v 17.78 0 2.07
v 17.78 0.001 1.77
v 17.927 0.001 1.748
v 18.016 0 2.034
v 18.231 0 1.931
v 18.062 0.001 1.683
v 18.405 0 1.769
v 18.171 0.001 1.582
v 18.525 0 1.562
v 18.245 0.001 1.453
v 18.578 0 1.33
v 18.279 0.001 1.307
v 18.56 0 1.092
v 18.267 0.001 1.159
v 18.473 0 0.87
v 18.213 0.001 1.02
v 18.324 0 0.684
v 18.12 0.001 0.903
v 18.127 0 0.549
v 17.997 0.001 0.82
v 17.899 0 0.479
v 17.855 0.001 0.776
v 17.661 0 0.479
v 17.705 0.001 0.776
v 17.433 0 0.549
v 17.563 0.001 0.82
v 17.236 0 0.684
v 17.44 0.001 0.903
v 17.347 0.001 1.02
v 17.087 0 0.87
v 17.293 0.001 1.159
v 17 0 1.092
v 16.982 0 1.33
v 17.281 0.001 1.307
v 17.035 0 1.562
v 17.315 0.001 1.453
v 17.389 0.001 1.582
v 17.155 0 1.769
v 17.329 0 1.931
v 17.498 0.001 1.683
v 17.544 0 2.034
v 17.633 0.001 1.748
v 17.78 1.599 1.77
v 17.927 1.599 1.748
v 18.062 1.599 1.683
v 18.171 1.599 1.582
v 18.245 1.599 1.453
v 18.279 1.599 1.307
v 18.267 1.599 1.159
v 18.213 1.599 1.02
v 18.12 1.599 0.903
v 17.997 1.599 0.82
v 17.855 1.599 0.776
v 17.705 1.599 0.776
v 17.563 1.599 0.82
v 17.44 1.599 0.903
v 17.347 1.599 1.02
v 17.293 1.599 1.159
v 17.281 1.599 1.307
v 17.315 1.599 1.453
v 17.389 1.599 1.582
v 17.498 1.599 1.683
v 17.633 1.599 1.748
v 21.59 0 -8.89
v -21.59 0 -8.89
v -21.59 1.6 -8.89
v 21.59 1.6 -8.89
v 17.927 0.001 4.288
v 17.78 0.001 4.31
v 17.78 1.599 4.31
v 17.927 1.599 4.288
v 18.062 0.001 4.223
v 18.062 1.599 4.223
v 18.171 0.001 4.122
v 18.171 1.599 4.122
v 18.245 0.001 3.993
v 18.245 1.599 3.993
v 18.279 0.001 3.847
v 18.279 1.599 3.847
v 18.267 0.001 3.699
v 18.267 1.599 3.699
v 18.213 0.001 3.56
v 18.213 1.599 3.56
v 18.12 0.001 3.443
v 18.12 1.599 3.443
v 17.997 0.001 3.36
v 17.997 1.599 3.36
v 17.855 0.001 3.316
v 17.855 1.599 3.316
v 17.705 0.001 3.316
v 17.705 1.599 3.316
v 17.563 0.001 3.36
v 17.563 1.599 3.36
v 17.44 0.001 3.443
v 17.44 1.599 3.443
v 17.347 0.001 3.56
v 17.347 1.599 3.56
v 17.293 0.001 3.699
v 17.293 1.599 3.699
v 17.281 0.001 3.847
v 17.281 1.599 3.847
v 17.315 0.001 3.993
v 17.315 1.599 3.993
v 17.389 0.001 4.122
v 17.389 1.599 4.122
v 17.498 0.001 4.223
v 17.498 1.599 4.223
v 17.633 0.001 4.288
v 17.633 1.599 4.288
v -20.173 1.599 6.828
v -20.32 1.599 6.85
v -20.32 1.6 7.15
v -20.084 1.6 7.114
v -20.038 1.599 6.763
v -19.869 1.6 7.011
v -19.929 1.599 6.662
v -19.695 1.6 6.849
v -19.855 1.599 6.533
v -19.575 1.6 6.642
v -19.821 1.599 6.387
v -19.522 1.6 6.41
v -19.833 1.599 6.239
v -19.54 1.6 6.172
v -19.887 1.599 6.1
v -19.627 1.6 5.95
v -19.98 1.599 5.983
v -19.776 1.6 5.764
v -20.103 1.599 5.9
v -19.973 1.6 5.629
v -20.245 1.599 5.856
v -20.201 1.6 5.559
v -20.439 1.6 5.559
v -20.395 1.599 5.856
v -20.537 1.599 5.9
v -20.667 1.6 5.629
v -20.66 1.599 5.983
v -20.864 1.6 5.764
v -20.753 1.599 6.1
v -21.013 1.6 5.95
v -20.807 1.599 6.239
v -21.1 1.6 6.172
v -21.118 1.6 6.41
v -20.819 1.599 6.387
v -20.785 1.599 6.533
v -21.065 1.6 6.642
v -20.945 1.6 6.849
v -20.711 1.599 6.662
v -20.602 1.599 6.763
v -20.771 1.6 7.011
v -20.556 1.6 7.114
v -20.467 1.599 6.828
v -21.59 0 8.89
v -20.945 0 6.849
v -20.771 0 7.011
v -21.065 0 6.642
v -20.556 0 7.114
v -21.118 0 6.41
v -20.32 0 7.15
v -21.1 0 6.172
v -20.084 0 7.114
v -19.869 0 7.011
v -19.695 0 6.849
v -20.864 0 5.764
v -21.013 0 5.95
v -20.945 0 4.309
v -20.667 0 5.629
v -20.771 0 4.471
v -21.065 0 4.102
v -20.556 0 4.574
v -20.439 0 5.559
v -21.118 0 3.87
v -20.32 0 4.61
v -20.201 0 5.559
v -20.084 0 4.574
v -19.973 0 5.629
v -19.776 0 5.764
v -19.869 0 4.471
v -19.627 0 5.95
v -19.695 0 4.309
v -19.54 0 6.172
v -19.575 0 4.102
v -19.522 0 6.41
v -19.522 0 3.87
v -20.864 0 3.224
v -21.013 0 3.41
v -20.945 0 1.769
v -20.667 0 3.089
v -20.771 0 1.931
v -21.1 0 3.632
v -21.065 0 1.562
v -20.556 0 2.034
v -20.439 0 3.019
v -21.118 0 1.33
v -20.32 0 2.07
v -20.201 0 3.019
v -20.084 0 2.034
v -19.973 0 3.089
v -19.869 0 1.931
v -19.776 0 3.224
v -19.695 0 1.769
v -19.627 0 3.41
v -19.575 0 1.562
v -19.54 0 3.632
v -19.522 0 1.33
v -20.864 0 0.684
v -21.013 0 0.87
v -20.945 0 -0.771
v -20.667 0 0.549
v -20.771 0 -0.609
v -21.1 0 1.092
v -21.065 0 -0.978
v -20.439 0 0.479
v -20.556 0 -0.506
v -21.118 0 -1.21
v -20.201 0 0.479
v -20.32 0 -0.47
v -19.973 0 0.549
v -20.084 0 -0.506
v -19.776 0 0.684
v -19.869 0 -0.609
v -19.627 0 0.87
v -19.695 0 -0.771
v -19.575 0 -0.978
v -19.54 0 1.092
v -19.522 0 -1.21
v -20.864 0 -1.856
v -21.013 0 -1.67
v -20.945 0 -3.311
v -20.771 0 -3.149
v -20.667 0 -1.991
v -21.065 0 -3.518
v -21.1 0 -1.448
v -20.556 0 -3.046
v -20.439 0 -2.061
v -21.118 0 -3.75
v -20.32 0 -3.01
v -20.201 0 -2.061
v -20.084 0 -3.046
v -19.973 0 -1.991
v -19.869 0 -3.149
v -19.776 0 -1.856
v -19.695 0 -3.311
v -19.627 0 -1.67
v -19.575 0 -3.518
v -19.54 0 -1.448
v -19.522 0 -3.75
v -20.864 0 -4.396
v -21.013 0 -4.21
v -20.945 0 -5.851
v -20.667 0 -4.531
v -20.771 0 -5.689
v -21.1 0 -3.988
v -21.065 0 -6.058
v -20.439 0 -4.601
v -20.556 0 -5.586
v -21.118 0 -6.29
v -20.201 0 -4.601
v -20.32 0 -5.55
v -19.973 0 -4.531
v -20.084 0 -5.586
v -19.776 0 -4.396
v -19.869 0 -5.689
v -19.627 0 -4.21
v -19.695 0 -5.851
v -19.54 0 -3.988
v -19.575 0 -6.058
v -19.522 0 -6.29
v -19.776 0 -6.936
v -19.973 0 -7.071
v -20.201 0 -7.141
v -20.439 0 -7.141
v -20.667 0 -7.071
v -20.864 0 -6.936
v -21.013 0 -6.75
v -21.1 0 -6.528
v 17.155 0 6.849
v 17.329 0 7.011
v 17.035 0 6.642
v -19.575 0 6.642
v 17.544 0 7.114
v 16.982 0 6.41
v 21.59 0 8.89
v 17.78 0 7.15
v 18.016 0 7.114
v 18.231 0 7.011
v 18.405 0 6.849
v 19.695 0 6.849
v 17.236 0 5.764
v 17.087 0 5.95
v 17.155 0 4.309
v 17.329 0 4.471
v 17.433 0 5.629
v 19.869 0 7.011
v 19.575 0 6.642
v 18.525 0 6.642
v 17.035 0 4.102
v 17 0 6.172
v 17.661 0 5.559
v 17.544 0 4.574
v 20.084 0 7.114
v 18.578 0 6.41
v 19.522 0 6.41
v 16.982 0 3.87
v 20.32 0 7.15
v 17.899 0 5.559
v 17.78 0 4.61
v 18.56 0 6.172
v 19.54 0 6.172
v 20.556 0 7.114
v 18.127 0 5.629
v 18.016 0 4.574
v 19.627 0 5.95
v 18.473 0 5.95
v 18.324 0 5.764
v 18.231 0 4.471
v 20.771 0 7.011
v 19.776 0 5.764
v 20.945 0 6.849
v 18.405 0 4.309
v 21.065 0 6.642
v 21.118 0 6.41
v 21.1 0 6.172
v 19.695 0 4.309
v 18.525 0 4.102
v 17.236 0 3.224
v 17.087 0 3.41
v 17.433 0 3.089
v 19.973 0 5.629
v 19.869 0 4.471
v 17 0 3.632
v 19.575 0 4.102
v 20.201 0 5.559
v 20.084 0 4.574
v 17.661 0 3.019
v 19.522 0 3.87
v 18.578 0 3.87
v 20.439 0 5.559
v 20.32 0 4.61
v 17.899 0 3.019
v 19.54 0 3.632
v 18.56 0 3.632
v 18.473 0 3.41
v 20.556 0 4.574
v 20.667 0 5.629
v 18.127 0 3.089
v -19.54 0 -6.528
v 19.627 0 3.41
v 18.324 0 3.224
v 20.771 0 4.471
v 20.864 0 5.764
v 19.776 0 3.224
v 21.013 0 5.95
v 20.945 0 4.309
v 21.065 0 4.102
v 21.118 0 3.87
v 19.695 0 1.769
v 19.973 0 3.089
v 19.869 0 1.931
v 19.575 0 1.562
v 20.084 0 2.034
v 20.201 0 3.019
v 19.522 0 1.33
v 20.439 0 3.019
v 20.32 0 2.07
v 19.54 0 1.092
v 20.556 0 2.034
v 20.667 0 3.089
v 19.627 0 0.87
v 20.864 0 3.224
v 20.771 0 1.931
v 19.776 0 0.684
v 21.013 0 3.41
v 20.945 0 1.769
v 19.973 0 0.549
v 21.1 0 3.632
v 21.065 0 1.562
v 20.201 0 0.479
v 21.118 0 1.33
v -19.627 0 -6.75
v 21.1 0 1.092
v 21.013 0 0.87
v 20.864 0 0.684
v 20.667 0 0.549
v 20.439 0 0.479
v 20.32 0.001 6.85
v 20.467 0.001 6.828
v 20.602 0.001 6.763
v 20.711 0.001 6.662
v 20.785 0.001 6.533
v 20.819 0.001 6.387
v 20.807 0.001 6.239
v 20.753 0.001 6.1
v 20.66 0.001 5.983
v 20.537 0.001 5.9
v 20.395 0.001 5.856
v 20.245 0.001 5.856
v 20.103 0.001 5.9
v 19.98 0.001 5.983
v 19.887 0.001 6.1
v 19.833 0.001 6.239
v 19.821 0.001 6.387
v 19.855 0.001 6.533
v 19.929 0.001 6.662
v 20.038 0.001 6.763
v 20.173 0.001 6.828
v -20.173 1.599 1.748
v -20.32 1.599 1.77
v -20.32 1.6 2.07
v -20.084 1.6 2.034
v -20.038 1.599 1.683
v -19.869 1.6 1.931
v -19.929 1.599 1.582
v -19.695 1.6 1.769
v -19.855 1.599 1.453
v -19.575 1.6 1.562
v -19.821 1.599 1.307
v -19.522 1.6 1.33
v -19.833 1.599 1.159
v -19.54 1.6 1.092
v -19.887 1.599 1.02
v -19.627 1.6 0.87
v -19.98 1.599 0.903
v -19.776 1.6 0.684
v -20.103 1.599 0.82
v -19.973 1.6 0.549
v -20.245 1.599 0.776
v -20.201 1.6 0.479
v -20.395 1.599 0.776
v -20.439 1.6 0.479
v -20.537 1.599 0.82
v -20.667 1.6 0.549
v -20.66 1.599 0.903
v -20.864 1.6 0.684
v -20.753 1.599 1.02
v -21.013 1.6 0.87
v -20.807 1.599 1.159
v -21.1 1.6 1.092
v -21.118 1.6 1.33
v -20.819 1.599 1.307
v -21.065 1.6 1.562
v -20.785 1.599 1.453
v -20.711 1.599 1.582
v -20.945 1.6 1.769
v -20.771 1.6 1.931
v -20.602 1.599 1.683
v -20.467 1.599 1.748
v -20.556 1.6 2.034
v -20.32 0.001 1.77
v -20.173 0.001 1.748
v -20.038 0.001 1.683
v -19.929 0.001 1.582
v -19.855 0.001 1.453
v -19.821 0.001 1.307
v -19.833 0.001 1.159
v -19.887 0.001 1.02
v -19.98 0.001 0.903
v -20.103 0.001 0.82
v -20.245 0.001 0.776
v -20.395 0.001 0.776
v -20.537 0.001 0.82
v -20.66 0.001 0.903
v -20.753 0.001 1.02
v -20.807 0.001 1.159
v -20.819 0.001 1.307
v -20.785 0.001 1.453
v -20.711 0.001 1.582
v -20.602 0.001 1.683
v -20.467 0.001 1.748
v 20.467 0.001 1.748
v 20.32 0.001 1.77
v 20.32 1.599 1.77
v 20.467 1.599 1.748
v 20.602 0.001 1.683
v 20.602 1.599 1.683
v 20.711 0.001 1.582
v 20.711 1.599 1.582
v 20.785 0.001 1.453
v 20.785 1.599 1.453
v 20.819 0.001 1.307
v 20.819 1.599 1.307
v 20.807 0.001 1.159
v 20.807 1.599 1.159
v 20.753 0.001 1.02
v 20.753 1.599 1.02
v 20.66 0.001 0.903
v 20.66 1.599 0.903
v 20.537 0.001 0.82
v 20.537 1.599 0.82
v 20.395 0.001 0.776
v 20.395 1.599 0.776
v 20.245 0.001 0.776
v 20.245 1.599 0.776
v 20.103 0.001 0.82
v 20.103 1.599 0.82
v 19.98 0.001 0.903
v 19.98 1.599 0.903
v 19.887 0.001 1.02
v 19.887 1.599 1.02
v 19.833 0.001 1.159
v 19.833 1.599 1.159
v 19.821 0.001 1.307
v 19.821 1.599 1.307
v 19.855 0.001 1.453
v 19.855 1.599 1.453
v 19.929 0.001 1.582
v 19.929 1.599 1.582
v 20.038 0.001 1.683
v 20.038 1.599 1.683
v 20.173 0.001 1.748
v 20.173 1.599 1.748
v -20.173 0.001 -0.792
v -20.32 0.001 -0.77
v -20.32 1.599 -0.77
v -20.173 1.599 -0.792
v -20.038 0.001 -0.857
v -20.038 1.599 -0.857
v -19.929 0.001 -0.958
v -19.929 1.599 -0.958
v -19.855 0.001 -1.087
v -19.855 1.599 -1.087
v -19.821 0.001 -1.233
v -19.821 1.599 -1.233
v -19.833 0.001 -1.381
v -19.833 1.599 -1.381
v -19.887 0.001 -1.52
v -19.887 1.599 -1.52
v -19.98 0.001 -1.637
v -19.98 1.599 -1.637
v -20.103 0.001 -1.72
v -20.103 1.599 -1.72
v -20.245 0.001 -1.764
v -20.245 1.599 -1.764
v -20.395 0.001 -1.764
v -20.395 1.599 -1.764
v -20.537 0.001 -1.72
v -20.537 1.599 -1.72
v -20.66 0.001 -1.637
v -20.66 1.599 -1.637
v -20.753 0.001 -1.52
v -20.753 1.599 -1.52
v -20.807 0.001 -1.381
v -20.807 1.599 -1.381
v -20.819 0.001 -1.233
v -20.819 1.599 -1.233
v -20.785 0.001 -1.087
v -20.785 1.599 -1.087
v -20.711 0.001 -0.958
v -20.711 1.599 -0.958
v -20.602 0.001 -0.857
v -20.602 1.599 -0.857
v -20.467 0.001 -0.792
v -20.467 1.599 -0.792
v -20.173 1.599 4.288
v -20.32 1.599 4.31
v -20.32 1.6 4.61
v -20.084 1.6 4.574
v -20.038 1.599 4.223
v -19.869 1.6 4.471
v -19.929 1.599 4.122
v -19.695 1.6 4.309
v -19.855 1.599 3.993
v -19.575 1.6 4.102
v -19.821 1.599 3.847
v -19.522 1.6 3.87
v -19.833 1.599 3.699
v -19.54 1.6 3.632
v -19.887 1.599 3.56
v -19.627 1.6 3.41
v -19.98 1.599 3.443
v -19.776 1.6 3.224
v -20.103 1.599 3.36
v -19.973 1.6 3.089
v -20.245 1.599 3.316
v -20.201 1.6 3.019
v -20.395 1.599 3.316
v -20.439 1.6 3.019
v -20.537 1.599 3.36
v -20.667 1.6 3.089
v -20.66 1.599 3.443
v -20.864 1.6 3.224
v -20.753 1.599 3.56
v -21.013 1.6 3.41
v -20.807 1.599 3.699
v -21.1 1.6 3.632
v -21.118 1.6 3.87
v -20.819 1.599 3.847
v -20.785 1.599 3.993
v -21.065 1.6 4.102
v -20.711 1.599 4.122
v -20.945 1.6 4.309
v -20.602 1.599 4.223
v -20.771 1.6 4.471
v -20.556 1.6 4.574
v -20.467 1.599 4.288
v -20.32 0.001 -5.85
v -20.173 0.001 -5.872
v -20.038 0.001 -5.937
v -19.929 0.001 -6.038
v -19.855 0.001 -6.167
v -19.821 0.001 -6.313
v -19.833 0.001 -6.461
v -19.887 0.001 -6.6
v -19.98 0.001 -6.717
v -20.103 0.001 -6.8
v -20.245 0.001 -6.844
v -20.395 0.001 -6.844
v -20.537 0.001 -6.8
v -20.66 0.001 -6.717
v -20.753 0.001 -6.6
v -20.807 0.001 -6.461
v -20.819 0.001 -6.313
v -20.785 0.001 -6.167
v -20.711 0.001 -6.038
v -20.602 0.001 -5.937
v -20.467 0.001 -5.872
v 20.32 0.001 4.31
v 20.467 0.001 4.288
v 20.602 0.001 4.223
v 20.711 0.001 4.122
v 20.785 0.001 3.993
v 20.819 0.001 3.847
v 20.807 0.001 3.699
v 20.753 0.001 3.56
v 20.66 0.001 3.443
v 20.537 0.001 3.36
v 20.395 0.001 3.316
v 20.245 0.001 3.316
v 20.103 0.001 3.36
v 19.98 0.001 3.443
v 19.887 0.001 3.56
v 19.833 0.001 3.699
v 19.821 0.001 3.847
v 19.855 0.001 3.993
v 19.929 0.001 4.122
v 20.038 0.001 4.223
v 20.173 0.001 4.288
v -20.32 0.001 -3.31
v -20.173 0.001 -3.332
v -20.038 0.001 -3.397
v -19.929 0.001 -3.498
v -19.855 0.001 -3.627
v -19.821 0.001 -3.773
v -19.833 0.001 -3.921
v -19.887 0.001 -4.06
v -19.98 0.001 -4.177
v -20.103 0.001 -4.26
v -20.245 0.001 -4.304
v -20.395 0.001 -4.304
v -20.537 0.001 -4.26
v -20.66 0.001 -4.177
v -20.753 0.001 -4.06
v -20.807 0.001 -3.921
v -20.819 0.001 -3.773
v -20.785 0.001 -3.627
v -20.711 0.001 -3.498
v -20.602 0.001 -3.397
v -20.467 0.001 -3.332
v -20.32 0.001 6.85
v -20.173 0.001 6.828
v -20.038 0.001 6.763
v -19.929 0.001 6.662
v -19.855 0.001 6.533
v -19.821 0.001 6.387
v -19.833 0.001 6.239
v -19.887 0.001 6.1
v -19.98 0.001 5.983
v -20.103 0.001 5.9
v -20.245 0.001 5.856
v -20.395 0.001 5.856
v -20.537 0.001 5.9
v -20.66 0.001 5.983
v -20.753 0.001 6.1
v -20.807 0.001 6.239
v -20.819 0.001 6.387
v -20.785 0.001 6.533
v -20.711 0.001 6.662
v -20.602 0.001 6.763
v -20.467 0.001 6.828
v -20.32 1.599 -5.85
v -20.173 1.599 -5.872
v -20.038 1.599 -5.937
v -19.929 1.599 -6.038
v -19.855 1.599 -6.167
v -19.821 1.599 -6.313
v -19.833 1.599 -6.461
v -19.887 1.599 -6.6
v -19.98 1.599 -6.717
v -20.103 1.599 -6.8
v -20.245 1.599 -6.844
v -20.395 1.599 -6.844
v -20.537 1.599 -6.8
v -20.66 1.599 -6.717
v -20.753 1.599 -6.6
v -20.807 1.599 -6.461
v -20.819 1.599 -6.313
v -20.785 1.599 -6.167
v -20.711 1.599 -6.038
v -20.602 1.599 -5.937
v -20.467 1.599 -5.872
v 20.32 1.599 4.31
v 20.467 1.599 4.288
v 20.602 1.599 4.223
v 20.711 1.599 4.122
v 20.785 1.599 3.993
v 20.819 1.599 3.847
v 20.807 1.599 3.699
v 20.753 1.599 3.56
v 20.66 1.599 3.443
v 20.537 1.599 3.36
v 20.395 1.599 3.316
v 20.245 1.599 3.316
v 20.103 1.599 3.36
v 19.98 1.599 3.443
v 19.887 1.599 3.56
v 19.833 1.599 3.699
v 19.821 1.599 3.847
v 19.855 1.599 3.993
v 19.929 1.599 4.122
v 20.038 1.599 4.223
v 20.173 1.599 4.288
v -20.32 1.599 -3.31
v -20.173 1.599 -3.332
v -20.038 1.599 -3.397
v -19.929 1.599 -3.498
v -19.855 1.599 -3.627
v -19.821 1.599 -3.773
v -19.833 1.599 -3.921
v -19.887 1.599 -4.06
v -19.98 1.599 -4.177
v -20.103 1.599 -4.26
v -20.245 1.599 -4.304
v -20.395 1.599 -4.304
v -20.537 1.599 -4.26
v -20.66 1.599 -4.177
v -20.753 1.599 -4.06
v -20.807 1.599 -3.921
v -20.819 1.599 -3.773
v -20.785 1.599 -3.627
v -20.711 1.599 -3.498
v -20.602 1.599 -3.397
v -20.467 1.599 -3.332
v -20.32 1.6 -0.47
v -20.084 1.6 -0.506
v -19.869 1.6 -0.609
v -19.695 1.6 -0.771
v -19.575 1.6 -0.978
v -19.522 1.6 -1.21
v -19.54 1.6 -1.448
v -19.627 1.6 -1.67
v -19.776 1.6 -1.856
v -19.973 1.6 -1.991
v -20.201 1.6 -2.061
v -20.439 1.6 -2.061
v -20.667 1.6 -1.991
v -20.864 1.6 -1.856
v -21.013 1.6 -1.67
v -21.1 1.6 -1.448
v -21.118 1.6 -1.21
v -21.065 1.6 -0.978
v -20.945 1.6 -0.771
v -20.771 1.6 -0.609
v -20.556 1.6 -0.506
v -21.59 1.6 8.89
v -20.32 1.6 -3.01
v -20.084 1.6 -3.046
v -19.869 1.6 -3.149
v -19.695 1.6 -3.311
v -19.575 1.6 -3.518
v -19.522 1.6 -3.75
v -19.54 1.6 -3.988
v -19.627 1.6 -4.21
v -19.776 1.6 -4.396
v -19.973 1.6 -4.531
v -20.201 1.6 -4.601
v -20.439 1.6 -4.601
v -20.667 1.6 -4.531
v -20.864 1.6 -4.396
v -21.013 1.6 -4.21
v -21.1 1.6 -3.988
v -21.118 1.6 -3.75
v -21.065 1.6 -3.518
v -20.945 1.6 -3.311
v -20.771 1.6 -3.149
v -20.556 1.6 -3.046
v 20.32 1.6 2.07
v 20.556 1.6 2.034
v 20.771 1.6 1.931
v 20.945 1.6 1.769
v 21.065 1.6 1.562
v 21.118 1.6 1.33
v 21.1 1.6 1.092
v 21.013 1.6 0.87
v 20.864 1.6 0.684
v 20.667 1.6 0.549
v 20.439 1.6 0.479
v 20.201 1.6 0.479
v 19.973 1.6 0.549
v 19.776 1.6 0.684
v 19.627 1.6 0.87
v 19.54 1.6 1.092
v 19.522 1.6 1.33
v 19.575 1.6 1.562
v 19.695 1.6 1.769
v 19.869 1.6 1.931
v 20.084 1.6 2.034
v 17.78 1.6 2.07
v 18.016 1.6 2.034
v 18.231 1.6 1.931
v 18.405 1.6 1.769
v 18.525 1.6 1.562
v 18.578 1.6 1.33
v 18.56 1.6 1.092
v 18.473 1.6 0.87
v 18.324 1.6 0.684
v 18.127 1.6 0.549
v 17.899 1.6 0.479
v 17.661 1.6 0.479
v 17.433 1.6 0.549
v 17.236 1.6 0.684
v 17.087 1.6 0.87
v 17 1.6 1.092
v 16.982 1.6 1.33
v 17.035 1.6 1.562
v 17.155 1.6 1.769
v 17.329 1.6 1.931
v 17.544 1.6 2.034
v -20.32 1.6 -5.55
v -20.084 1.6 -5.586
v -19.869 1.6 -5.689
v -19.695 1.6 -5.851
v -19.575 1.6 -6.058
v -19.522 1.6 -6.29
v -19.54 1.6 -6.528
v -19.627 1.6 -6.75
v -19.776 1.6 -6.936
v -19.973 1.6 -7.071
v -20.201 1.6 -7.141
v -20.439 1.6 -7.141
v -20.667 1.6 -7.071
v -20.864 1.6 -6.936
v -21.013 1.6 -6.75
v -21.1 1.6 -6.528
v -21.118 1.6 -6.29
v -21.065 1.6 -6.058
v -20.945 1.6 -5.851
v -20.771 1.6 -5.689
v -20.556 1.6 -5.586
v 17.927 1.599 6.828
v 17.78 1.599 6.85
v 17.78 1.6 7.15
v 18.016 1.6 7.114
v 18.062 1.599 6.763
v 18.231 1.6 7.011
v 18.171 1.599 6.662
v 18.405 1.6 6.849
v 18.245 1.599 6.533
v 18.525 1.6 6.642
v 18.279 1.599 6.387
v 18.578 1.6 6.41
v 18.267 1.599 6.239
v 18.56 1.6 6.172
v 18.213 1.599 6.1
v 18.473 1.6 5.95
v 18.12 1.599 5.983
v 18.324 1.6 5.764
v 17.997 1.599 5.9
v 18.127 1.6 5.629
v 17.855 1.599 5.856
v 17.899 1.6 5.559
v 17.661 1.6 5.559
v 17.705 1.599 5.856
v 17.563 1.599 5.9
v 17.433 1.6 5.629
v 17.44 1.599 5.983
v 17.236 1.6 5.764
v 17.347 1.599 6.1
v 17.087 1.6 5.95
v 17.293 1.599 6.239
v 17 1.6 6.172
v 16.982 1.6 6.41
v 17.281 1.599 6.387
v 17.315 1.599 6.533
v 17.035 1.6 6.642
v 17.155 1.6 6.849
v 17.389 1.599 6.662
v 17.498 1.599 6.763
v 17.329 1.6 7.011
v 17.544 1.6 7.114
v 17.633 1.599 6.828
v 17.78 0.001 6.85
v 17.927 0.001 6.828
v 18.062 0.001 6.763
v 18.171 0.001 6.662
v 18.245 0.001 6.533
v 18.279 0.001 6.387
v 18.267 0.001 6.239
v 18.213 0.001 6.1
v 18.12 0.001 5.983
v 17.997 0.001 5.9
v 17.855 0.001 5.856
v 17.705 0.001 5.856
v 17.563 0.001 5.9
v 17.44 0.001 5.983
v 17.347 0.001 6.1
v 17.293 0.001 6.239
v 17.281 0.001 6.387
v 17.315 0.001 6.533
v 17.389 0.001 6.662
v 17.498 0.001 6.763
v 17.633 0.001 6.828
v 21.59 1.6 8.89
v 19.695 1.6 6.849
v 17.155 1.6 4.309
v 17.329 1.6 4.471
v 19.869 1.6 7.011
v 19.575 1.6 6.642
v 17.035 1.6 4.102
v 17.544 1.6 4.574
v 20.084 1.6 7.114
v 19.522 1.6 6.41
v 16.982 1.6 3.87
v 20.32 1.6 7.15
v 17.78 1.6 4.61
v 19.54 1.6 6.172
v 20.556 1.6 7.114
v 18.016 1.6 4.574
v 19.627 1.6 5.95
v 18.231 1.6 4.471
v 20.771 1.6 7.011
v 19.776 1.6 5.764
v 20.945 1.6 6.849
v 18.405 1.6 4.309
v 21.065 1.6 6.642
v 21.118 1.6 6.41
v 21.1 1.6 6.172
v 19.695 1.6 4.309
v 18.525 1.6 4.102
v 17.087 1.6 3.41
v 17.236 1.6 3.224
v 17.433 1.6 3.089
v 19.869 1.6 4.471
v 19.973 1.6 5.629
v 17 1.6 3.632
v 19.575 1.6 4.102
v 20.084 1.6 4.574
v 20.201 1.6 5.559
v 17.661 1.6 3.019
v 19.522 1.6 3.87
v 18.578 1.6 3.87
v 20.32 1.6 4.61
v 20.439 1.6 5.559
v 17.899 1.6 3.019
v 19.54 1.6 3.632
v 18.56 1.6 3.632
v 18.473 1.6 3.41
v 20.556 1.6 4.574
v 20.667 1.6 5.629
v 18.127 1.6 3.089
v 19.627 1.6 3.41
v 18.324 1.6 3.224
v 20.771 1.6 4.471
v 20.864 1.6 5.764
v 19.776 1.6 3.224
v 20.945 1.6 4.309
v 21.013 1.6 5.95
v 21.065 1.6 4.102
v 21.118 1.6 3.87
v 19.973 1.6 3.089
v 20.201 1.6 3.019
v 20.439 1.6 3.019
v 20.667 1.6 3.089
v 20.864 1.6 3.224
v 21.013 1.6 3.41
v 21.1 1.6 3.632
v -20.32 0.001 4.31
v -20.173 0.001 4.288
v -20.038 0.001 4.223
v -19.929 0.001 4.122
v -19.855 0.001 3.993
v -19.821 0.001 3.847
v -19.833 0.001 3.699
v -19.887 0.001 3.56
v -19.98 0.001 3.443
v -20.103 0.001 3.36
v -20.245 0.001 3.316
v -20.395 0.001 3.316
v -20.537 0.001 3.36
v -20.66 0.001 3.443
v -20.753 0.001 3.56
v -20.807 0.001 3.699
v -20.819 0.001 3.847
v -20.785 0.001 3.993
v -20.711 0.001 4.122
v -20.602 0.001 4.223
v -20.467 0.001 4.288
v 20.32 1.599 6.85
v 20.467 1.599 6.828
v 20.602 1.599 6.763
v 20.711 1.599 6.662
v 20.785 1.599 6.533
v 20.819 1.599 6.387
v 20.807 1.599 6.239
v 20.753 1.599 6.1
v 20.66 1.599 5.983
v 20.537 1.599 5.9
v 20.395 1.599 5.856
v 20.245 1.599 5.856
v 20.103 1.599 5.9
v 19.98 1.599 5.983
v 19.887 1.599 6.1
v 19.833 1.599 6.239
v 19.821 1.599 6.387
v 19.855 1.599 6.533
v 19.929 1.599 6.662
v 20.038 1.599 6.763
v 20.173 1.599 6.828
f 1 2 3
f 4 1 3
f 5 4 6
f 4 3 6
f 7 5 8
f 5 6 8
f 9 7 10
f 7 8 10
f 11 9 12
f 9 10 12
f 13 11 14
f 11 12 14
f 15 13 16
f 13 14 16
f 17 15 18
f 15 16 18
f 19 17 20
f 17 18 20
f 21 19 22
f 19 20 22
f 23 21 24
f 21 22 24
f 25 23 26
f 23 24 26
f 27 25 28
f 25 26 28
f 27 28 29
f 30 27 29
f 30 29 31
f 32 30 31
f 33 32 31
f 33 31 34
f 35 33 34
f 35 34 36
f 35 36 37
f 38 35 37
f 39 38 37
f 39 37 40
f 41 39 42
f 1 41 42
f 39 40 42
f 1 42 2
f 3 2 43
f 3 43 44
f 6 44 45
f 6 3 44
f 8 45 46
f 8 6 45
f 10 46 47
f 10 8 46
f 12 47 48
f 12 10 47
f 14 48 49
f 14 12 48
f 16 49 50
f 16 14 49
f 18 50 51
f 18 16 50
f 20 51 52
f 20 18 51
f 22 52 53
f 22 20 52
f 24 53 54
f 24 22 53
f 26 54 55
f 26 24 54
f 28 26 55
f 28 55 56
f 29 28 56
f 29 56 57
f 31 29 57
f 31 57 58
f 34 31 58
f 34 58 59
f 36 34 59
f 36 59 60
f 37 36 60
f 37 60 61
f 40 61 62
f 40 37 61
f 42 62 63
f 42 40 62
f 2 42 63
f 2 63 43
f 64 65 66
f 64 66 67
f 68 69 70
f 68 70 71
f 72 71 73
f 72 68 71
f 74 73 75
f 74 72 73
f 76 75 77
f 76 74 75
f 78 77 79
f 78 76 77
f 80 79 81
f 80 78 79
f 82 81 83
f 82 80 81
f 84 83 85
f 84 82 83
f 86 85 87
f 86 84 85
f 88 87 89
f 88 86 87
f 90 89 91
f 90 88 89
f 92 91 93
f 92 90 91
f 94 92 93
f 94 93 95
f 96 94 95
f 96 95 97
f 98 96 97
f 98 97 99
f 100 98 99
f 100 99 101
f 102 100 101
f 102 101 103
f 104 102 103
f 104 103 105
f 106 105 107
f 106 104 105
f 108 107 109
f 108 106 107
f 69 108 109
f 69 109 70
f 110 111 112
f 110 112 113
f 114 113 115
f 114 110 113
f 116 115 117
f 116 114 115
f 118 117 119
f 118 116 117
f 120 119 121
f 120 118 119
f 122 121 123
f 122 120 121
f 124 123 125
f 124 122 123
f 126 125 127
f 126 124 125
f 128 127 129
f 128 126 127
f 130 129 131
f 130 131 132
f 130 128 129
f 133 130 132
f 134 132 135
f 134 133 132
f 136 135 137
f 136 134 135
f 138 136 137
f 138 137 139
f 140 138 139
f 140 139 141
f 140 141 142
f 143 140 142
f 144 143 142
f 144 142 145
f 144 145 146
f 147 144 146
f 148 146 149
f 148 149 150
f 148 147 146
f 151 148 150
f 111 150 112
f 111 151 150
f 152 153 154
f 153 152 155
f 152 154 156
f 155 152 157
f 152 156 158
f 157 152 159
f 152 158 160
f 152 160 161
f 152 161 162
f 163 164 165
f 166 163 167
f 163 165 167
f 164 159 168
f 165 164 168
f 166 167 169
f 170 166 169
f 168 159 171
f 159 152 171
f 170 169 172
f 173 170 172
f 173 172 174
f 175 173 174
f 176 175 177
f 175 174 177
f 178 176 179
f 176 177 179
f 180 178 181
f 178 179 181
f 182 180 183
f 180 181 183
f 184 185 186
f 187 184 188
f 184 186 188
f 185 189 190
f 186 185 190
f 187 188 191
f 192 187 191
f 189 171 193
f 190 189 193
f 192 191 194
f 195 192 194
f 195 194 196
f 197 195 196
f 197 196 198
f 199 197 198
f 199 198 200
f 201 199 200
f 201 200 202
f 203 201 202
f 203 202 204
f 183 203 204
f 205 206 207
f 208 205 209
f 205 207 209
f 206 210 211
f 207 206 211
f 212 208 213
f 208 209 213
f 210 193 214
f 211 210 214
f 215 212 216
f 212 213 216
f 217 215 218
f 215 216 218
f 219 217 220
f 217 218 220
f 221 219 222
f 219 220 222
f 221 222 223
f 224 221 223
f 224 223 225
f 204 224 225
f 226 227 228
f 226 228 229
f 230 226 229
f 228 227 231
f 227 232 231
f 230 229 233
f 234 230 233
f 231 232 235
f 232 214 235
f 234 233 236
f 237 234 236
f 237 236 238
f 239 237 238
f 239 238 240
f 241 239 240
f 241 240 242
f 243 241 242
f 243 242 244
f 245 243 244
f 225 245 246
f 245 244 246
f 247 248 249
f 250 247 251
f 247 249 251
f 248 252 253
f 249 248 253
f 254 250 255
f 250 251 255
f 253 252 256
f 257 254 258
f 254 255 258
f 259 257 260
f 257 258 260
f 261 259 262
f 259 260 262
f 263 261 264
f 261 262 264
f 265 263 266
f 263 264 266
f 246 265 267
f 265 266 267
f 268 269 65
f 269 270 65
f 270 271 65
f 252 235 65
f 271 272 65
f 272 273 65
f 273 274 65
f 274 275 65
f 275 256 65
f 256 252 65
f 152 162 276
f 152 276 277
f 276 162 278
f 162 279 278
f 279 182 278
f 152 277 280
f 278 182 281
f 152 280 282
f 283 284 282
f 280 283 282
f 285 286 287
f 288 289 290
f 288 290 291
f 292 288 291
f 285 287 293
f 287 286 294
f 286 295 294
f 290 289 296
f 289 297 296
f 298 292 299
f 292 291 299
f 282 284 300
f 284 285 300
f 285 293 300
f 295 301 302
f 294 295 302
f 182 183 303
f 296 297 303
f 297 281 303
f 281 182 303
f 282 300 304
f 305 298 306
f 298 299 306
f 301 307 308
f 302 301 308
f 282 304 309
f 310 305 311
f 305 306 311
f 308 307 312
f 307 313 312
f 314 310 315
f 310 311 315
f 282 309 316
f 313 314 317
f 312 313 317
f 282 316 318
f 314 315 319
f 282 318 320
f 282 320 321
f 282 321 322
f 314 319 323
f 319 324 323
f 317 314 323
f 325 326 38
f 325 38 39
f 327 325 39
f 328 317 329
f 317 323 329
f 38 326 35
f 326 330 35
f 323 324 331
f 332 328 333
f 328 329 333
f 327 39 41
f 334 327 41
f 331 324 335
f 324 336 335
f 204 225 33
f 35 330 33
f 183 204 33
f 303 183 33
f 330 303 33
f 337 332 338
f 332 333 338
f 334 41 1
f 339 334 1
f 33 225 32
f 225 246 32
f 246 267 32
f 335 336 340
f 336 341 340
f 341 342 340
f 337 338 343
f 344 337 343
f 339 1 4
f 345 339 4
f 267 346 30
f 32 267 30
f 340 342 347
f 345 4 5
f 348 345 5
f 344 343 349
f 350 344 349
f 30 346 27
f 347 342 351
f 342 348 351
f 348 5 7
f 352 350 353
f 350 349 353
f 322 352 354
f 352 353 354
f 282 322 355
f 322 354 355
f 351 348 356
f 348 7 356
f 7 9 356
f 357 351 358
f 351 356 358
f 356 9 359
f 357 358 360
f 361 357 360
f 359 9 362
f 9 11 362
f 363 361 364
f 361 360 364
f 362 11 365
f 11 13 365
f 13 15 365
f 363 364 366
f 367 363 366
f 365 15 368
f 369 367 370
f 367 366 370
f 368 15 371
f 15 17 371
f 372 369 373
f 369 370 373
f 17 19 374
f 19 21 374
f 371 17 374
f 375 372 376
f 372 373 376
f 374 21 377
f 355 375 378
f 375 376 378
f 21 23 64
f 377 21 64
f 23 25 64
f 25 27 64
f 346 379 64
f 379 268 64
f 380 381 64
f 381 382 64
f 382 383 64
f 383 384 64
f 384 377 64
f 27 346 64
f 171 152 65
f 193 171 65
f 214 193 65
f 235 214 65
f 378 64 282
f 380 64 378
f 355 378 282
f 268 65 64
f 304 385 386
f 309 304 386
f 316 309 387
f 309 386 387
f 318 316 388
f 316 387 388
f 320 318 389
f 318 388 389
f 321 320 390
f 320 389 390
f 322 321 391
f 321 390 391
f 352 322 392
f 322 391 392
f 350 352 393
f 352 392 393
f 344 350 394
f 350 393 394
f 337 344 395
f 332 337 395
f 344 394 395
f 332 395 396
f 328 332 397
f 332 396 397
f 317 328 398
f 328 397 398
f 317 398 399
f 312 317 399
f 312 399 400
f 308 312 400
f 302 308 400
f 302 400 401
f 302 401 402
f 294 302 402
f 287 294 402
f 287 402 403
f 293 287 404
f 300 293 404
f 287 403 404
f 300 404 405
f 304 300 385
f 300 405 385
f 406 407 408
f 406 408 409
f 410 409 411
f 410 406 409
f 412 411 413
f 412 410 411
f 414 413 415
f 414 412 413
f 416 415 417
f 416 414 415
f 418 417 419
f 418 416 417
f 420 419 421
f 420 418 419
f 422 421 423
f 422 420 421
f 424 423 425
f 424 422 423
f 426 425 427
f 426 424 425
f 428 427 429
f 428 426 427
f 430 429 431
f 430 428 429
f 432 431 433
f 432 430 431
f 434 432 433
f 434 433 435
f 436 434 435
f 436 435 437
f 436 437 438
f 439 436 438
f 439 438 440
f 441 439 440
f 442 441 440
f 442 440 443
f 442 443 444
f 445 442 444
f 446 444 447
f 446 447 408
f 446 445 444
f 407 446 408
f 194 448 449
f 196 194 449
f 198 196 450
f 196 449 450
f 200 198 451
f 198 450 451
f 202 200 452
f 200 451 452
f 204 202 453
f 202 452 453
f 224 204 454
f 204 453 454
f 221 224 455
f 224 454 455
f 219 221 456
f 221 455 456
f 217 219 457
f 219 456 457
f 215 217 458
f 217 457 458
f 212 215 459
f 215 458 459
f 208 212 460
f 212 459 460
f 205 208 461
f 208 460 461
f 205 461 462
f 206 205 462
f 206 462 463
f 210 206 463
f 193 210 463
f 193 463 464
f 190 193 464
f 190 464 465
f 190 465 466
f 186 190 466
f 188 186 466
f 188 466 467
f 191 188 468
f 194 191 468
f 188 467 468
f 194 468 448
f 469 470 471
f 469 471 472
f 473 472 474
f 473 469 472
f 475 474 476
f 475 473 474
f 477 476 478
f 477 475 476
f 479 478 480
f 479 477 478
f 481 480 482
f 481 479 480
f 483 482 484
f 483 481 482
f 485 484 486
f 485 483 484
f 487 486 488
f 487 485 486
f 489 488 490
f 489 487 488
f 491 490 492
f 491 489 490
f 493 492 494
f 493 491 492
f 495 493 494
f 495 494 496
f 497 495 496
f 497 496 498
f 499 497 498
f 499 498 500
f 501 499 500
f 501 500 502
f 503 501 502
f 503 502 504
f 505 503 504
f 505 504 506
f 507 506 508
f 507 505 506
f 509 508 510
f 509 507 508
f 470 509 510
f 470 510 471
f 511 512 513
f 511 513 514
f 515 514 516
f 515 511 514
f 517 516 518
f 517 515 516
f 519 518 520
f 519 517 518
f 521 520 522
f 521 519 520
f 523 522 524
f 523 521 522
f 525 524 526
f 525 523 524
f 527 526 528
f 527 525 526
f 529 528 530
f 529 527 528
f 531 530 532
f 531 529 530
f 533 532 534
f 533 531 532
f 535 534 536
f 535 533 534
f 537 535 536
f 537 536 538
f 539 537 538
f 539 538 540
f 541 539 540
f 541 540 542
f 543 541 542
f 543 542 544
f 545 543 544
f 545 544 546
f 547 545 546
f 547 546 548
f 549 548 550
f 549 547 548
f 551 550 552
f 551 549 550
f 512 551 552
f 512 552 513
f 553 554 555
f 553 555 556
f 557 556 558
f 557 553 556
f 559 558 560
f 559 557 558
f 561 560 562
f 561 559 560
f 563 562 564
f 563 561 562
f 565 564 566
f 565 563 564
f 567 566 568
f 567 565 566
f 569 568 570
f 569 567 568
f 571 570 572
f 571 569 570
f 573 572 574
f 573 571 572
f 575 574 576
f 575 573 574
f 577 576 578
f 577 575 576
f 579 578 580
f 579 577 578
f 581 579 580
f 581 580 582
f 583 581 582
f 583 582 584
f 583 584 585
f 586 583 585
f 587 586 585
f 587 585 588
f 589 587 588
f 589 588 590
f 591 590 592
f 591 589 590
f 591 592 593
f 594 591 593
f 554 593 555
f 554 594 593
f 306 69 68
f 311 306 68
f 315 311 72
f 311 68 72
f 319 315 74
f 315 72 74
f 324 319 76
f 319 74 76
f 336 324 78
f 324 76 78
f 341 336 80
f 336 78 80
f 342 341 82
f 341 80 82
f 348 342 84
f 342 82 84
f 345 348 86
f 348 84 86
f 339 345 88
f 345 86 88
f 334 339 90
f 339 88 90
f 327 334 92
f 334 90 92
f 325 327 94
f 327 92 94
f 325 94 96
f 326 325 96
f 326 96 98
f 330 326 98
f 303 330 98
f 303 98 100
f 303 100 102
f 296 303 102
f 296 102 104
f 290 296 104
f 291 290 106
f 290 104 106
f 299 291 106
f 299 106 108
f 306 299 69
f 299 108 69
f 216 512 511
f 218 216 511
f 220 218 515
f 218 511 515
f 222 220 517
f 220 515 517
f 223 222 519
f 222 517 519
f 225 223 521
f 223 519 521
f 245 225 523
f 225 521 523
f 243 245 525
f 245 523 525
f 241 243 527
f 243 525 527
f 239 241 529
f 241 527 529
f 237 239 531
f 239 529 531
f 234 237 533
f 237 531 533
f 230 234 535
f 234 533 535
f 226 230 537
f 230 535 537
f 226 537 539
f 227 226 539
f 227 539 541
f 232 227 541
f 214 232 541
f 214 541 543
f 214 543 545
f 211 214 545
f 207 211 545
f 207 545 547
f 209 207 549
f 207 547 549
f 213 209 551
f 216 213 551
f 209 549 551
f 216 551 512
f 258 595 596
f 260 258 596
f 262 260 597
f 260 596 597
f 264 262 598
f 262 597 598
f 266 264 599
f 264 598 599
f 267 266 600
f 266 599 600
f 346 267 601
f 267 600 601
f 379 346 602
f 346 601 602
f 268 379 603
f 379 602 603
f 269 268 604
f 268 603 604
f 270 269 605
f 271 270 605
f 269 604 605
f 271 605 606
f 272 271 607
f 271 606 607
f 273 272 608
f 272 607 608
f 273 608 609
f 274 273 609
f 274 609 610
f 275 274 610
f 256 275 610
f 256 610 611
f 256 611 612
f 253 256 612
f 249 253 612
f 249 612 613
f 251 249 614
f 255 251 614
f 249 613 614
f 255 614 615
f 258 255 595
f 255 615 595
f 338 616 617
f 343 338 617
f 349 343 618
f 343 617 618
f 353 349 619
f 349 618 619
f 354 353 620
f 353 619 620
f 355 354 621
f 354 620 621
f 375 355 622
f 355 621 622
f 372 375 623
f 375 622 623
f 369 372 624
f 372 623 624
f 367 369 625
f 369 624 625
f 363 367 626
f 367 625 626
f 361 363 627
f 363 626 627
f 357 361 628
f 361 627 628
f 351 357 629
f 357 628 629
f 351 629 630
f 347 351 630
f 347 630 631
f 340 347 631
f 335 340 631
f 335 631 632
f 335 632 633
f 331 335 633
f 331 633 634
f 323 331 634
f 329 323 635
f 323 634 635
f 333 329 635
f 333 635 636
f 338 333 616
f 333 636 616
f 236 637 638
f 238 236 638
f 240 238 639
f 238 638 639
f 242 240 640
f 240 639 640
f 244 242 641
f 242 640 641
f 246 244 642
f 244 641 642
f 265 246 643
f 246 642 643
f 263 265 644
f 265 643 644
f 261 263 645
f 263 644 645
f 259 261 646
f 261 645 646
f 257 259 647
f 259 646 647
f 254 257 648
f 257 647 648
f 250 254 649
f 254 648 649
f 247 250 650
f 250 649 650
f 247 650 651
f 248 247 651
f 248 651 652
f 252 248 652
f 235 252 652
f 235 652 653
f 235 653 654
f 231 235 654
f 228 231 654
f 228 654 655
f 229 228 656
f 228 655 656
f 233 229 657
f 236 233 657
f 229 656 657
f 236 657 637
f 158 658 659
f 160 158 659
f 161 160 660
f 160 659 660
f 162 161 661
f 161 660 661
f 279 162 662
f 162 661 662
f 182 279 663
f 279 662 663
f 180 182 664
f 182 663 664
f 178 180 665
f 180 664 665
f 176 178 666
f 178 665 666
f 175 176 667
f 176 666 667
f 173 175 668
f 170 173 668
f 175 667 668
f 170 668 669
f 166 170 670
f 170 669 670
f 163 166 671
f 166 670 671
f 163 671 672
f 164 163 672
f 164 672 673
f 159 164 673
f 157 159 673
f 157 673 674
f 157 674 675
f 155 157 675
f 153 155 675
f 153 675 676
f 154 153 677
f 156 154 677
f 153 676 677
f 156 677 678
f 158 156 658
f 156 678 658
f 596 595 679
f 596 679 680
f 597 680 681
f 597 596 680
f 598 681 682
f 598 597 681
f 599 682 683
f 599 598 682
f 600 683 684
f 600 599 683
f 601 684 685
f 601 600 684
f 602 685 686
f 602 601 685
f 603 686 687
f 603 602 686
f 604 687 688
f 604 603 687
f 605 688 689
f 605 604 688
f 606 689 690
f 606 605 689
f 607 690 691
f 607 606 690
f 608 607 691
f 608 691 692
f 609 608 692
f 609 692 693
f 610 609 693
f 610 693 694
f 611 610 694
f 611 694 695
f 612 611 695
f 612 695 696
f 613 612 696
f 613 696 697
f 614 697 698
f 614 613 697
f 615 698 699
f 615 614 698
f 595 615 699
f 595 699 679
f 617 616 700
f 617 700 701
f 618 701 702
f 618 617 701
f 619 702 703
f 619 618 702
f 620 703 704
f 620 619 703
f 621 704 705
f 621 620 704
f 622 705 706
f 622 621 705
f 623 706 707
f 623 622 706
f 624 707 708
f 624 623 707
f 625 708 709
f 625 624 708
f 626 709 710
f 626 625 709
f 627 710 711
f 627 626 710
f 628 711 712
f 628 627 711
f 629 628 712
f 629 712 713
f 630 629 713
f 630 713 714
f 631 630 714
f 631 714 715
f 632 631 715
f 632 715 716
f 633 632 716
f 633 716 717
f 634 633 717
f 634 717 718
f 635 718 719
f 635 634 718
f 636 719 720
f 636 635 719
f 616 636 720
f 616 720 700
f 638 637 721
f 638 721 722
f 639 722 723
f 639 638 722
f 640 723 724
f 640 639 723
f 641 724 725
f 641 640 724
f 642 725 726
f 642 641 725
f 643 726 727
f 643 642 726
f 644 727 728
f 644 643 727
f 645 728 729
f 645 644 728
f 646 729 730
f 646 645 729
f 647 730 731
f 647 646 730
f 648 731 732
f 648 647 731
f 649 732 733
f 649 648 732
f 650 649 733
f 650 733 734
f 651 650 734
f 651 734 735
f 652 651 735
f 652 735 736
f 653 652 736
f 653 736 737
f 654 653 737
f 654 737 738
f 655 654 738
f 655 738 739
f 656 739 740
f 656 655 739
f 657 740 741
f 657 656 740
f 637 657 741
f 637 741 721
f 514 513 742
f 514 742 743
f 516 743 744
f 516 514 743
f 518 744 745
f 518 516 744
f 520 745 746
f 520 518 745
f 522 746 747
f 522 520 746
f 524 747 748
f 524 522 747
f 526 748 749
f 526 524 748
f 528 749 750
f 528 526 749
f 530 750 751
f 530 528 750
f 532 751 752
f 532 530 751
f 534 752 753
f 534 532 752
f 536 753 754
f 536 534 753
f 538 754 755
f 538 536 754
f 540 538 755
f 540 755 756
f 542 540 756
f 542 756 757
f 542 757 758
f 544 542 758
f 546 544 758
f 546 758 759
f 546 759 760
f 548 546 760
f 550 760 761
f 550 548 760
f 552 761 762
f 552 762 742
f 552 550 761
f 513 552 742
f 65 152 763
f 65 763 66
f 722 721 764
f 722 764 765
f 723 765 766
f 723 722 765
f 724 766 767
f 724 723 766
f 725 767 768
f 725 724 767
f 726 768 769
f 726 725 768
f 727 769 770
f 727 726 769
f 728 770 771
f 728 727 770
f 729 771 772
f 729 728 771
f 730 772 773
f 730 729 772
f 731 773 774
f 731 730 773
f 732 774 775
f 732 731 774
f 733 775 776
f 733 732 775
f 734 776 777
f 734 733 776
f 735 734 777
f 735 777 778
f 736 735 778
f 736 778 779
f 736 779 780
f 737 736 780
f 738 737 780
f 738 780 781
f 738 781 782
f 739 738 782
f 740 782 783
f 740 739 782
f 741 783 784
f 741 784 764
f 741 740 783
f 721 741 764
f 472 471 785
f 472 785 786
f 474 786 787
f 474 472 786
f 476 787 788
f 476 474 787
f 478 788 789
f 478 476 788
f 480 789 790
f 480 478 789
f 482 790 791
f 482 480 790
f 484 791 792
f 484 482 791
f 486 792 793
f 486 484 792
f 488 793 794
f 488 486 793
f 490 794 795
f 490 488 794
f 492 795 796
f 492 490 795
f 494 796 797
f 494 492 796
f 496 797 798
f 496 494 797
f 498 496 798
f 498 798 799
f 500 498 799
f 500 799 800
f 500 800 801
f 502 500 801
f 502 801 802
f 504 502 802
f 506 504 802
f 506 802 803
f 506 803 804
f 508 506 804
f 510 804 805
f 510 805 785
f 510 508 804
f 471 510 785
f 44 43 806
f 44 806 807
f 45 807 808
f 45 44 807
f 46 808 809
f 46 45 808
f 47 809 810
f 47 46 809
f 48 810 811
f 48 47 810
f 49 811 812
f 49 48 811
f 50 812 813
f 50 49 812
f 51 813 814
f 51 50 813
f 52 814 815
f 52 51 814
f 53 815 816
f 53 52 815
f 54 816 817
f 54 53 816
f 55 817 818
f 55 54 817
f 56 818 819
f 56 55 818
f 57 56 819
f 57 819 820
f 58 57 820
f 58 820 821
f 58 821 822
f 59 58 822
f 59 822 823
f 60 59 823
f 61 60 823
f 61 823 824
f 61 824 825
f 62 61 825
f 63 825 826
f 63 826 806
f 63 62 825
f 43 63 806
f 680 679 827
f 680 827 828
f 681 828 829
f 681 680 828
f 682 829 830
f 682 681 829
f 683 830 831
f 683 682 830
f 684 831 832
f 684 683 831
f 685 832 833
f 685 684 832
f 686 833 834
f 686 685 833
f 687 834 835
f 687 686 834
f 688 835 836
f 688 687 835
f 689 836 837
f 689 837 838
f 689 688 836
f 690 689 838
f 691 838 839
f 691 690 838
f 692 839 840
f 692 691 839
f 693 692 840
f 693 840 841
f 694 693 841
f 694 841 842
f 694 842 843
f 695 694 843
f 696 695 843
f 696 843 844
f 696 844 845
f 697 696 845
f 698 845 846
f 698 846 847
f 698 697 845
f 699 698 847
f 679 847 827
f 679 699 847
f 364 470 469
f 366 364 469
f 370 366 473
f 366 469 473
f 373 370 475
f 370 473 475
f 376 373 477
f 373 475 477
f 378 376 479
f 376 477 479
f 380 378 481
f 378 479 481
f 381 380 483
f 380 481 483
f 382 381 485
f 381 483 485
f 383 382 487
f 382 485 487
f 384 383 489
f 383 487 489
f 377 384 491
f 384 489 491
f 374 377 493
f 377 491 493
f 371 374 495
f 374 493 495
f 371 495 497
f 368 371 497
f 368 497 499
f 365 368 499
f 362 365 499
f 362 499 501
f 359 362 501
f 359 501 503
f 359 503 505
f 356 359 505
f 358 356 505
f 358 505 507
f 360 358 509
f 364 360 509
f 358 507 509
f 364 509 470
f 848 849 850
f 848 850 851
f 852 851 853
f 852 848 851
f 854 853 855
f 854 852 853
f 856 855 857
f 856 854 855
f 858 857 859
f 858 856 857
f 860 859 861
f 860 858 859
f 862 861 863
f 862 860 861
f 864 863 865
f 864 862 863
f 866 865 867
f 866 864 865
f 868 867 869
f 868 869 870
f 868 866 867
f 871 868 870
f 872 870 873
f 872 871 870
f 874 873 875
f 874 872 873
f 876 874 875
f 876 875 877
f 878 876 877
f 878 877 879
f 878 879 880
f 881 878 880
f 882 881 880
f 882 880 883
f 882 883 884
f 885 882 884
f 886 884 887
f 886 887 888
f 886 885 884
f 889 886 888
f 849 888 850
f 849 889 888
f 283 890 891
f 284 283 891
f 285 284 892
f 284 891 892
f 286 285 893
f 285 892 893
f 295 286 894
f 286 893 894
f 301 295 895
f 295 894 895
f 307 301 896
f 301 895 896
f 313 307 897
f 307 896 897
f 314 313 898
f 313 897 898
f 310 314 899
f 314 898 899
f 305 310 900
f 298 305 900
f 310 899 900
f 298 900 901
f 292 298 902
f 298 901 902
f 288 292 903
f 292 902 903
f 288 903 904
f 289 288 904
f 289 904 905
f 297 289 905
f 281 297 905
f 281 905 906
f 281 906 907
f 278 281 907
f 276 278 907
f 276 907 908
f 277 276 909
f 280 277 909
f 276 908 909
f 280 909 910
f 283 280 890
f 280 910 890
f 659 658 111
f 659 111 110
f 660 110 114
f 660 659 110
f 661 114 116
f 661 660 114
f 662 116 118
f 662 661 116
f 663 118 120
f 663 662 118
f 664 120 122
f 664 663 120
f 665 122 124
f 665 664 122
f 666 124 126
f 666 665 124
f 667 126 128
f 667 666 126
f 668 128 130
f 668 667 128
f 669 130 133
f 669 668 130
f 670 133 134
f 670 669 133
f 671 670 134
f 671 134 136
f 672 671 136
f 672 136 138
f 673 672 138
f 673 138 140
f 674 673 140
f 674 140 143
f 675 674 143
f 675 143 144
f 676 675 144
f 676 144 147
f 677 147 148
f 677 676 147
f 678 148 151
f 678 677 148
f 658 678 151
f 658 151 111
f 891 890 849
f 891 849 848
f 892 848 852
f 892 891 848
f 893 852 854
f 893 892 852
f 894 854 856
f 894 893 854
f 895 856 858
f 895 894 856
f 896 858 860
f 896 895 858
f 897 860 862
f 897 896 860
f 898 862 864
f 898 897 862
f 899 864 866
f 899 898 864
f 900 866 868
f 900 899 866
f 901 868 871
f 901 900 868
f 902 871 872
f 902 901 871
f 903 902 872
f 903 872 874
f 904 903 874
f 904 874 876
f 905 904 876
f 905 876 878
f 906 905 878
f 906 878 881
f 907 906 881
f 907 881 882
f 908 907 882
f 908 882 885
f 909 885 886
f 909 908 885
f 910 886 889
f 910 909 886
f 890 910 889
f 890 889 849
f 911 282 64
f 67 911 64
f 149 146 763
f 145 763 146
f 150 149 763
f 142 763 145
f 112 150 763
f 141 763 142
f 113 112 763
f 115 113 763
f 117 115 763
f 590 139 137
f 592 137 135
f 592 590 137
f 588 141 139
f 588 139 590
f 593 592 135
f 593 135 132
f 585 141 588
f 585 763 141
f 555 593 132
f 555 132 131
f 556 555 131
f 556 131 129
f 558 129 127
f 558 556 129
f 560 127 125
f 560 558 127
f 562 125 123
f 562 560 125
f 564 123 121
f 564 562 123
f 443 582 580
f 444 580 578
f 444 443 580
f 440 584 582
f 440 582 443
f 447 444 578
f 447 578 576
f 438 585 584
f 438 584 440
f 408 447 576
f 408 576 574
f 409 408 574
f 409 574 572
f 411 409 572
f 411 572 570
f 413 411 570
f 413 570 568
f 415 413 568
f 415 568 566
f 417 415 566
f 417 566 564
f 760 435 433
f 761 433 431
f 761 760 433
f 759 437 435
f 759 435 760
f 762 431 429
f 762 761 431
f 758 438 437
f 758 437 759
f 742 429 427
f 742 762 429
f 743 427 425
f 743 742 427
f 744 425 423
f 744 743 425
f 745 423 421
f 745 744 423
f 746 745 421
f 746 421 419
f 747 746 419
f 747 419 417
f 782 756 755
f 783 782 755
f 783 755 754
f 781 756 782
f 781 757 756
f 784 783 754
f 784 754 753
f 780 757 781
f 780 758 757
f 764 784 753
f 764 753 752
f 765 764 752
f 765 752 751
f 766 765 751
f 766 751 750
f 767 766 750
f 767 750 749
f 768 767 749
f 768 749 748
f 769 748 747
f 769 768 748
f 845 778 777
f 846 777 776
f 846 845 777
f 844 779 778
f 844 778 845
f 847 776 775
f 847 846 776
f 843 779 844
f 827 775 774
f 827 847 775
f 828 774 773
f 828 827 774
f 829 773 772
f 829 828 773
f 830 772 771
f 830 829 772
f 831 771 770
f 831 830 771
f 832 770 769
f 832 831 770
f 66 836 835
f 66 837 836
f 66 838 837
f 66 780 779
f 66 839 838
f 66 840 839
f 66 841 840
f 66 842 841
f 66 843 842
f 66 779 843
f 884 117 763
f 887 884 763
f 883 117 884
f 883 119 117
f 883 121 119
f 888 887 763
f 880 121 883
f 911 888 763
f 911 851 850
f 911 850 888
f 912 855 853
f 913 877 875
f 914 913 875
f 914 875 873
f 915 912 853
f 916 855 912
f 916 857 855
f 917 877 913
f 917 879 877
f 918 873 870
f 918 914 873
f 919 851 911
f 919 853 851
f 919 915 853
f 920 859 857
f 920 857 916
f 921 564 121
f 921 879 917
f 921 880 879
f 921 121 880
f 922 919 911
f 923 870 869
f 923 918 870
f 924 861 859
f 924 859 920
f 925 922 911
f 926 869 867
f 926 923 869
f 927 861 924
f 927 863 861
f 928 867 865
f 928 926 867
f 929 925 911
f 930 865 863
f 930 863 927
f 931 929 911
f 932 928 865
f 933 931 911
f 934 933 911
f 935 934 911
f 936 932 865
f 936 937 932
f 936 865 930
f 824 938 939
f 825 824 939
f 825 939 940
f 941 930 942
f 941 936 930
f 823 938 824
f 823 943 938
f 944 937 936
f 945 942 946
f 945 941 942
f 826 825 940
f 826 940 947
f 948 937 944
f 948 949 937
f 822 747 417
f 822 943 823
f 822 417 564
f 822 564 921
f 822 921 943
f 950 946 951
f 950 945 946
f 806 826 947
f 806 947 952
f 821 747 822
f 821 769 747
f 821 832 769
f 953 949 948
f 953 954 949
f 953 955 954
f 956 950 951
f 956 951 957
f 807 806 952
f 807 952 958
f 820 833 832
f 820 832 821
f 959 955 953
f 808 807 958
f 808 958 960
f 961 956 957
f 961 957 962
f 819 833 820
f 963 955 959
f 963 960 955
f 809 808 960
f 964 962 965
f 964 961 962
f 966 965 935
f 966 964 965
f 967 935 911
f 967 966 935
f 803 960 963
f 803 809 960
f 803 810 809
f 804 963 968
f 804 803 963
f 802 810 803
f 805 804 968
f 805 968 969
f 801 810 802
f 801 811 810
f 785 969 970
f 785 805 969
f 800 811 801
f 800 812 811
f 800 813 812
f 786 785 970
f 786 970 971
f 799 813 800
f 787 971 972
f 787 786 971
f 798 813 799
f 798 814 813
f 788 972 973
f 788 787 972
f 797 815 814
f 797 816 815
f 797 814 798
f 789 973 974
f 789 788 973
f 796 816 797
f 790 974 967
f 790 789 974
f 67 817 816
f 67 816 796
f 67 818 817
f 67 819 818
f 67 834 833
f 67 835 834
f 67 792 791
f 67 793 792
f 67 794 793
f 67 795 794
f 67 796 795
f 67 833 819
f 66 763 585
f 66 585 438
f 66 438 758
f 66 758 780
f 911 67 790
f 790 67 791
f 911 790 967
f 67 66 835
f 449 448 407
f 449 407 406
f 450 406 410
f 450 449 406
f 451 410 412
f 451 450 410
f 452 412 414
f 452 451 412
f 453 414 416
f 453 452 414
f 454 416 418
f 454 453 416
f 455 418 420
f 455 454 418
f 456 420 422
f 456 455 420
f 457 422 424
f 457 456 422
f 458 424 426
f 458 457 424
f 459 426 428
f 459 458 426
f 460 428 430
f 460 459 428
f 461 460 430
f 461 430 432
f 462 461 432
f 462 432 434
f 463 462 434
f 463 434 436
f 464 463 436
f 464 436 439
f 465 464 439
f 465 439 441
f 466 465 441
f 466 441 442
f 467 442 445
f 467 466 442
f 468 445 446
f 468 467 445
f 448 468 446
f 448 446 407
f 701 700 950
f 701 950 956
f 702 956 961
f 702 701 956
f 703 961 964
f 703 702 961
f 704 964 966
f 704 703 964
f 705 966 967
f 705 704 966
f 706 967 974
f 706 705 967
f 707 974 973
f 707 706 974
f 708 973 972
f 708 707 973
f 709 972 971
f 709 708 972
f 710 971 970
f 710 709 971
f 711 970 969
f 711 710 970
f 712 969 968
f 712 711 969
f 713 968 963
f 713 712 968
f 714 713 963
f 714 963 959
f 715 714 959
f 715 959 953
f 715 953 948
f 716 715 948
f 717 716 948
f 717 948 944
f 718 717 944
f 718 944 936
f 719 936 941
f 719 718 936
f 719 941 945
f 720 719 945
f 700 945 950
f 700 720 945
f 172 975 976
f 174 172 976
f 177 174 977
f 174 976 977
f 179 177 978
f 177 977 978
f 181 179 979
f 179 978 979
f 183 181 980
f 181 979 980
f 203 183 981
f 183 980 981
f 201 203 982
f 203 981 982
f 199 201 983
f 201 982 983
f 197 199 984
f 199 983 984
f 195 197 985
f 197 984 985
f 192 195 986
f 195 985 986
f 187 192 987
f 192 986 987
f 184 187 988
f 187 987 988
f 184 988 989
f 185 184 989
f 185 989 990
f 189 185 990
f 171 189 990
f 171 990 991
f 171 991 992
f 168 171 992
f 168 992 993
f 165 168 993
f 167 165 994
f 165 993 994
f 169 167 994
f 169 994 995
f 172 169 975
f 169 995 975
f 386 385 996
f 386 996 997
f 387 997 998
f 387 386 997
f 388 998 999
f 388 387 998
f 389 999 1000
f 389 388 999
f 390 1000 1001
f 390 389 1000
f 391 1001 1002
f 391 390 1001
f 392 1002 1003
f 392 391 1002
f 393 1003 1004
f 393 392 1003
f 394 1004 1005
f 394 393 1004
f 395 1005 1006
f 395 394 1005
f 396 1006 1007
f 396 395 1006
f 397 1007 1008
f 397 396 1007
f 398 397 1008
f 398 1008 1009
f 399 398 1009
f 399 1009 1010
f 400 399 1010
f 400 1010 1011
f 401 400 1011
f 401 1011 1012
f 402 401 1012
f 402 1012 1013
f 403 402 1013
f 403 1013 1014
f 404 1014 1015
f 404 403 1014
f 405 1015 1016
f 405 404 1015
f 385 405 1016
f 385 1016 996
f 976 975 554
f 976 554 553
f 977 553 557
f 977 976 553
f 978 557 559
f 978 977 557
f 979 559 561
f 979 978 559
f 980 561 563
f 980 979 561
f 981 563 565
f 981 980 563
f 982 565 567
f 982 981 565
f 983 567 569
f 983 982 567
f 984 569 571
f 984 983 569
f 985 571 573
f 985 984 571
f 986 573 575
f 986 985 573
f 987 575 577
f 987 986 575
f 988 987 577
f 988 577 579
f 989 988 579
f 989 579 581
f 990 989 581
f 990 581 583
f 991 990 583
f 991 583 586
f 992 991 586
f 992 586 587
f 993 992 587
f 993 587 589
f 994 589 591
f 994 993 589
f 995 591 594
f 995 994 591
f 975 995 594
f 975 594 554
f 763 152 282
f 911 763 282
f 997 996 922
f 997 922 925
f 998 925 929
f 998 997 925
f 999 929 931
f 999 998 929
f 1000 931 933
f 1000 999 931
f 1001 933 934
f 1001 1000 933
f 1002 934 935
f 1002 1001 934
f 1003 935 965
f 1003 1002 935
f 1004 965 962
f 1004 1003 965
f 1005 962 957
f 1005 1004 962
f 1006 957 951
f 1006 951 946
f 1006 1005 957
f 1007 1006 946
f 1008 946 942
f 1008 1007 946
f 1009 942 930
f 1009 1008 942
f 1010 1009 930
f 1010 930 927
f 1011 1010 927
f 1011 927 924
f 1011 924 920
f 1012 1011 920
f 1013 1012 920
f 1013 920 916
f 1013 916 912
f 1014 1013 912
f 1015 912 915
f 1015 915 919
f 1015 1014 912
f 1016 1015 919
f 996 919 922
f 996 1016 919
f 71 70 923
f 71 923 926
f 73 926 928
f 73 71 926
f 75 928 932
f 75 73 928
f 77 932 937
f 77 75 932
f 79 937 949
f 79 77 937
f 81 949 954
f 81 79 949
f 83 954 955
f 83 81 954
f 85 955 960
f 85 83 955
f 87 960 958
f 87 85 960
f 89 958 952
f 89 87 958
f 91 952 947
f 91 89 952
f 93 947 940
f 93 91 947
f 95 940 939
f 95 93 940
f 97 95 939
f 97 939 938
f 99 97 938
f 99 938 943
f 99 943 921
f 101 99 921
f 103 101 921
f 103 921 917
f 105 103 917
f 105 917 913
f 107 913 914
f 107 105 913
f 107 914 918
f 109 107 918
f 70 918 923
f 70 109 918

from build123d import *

# Parameters (mm, degrees)
SKETCH1_W           = 43.18
SKETCH1_H           = 17.78
SKETCH1_R           = 0.5
BOSS_EXTRUDE1_DEPTH = 1.6
CHAMFER1_SIZE       = 0.3
CHAMFER1_SIZE2      = 0.000523599
CHAMFER2_SIZE       = 0.3
CHAMFER2_SIZE2      = 0.000523599


with BuildPart() as part:
    # Sketch1 → Boss-Extrude1 (new body)
    with BuildSketch(Plane(origin=(0, 0, 0), x_dir=(1, 0, 0), z_dir=(0, 1, 0))):
        Rectangle(SKETCH1_W, SKETCH1_H)
        with Locations(Location((20.32, -6.35, 0), (0, 0, 270))):
            Circle(SKETCH1_R, mode=Mode.SUBTRACT)
        with Locations(Location((-20.32, 3.81, 0), (0, 0, 270))):
            Circle(SKETCH1_R, mode=Mode.SUBTRACT)
        with Locations(Location((-20.32, 1.27, 0), (0, 0, 270))):
            Circle(SKETCH1_R, mode=Mode.SUBTRACT)
        with Locations(Location((-20.32, -1.27, 0), (0, 0, 270))):
            Circle(SKETCH1_R, mode=Mode.SUBTRACT)
        with Locations(Location((-20.32, 6.35, 0), (0, 0, 270))):
            Circle(SKETCH1_R, mode=Mode.SUBTRACT)
        with Locations(Location((-20.32, -3.81, 0), (0, 0, 270))):
            Circle(SKETCH1_R, mode=Mode.SUBTRACT)
        with Locations(Location((-20.32, -6.35, 0), (0, 0, 270))):
            Circle(SKETCH1_R, mode=Mode.SUBTRACT)
        with Locations(Location((17.78, -6.35, 0), (0, 0, 270))):
            Circle(SKETCH1_R, mode=Mode.SUBTRACT)
        with Locations(Location((17.78, -3.81, 0), (0, 0, 270))):
            Circle(SKETCH1_R, mode=Mode.SUBTRACT)
        with Locations(Location((17.78, -1.27, 0), (0, 0, 270))):
            Circle(SKETCH1_R, mode=Mode.SUBTRACT)
        with Locations(Location((20.32, -3.81, 0), (0, 0, 270))):
            Circle(SKETCH1_R, mode=Mode.SUBTRACT)
        with Locations(Location((20.32, -1.27, 0), (0, 0, 270))):
            Circle(SKETCH1_R, mode=Mode.SUBTRACT)
    extrude(amount=BOSS_EXTRUDE1_DEPTH)

    # Chamfer1
    chamfer1_edges = [part.edges().sort_by_distance(p)[0] for p in [
        (20.32, 1.6, 5.85),
        (-20.32, 1.6, -4.31),
        (-20.32, 1.6, -1.77),
        (-20.32, 1.6, 0.77),
        (-20.32, 1.6, 3.31),
        (-20.32, 1.6, 5.85),
        (-20.32, 1.6, -6.85),
        (17.78, 1.6, 5.85),
        (17.78, 1.6, 3.31),
        (17.78, 1.6, 0.77),
        (20.32, 1.6, 3.31),
        (20.32, 1.6, 0.77),
    ]]
    chamfer1_side = [part.faces().sort_by_distance(p)[0] for p in [
        (0.007892141, 1.6, -0.023676424),
    ]]
    chamfer(chamfer1_edges, length=CHAMFER1_SIZE, length2=CHAMFER1_SIZE2, reference=chamfer1_side[0])

    # Chamfer2
    chamfer2_edges = [part.edges().sort_by_distance(p)[0] for p in [
        (20.32, 0, 5.85),
        (-20.32, 0, -4.31),
        (-20.32, 0, -1.77),
        (-20.32, 0, 0.77),
        (-20.32, 0, 3.31),
        (-20.32, 0, 5.85),
        (-20.32, 0, -6.85),
        (17.78, 0, 5.85),
        (17.78, 0, 3.31),
        (17.78, 0, 0.77),
        (20.32, 0, 3.31),
        (20.32, 0, 0.77),
    ]]
    chamfer2_side = [part.faces().sort_by_distance(p)[0] for p in [
        (0.007892141, 0, -0.023676424),
    ]]
    chamfer(chamfer2_edges, length=CHAMFER2_SIZE, length2=CHAMFER2_SIZE2, reference=chamfer2_side[0])


solid = part.part
